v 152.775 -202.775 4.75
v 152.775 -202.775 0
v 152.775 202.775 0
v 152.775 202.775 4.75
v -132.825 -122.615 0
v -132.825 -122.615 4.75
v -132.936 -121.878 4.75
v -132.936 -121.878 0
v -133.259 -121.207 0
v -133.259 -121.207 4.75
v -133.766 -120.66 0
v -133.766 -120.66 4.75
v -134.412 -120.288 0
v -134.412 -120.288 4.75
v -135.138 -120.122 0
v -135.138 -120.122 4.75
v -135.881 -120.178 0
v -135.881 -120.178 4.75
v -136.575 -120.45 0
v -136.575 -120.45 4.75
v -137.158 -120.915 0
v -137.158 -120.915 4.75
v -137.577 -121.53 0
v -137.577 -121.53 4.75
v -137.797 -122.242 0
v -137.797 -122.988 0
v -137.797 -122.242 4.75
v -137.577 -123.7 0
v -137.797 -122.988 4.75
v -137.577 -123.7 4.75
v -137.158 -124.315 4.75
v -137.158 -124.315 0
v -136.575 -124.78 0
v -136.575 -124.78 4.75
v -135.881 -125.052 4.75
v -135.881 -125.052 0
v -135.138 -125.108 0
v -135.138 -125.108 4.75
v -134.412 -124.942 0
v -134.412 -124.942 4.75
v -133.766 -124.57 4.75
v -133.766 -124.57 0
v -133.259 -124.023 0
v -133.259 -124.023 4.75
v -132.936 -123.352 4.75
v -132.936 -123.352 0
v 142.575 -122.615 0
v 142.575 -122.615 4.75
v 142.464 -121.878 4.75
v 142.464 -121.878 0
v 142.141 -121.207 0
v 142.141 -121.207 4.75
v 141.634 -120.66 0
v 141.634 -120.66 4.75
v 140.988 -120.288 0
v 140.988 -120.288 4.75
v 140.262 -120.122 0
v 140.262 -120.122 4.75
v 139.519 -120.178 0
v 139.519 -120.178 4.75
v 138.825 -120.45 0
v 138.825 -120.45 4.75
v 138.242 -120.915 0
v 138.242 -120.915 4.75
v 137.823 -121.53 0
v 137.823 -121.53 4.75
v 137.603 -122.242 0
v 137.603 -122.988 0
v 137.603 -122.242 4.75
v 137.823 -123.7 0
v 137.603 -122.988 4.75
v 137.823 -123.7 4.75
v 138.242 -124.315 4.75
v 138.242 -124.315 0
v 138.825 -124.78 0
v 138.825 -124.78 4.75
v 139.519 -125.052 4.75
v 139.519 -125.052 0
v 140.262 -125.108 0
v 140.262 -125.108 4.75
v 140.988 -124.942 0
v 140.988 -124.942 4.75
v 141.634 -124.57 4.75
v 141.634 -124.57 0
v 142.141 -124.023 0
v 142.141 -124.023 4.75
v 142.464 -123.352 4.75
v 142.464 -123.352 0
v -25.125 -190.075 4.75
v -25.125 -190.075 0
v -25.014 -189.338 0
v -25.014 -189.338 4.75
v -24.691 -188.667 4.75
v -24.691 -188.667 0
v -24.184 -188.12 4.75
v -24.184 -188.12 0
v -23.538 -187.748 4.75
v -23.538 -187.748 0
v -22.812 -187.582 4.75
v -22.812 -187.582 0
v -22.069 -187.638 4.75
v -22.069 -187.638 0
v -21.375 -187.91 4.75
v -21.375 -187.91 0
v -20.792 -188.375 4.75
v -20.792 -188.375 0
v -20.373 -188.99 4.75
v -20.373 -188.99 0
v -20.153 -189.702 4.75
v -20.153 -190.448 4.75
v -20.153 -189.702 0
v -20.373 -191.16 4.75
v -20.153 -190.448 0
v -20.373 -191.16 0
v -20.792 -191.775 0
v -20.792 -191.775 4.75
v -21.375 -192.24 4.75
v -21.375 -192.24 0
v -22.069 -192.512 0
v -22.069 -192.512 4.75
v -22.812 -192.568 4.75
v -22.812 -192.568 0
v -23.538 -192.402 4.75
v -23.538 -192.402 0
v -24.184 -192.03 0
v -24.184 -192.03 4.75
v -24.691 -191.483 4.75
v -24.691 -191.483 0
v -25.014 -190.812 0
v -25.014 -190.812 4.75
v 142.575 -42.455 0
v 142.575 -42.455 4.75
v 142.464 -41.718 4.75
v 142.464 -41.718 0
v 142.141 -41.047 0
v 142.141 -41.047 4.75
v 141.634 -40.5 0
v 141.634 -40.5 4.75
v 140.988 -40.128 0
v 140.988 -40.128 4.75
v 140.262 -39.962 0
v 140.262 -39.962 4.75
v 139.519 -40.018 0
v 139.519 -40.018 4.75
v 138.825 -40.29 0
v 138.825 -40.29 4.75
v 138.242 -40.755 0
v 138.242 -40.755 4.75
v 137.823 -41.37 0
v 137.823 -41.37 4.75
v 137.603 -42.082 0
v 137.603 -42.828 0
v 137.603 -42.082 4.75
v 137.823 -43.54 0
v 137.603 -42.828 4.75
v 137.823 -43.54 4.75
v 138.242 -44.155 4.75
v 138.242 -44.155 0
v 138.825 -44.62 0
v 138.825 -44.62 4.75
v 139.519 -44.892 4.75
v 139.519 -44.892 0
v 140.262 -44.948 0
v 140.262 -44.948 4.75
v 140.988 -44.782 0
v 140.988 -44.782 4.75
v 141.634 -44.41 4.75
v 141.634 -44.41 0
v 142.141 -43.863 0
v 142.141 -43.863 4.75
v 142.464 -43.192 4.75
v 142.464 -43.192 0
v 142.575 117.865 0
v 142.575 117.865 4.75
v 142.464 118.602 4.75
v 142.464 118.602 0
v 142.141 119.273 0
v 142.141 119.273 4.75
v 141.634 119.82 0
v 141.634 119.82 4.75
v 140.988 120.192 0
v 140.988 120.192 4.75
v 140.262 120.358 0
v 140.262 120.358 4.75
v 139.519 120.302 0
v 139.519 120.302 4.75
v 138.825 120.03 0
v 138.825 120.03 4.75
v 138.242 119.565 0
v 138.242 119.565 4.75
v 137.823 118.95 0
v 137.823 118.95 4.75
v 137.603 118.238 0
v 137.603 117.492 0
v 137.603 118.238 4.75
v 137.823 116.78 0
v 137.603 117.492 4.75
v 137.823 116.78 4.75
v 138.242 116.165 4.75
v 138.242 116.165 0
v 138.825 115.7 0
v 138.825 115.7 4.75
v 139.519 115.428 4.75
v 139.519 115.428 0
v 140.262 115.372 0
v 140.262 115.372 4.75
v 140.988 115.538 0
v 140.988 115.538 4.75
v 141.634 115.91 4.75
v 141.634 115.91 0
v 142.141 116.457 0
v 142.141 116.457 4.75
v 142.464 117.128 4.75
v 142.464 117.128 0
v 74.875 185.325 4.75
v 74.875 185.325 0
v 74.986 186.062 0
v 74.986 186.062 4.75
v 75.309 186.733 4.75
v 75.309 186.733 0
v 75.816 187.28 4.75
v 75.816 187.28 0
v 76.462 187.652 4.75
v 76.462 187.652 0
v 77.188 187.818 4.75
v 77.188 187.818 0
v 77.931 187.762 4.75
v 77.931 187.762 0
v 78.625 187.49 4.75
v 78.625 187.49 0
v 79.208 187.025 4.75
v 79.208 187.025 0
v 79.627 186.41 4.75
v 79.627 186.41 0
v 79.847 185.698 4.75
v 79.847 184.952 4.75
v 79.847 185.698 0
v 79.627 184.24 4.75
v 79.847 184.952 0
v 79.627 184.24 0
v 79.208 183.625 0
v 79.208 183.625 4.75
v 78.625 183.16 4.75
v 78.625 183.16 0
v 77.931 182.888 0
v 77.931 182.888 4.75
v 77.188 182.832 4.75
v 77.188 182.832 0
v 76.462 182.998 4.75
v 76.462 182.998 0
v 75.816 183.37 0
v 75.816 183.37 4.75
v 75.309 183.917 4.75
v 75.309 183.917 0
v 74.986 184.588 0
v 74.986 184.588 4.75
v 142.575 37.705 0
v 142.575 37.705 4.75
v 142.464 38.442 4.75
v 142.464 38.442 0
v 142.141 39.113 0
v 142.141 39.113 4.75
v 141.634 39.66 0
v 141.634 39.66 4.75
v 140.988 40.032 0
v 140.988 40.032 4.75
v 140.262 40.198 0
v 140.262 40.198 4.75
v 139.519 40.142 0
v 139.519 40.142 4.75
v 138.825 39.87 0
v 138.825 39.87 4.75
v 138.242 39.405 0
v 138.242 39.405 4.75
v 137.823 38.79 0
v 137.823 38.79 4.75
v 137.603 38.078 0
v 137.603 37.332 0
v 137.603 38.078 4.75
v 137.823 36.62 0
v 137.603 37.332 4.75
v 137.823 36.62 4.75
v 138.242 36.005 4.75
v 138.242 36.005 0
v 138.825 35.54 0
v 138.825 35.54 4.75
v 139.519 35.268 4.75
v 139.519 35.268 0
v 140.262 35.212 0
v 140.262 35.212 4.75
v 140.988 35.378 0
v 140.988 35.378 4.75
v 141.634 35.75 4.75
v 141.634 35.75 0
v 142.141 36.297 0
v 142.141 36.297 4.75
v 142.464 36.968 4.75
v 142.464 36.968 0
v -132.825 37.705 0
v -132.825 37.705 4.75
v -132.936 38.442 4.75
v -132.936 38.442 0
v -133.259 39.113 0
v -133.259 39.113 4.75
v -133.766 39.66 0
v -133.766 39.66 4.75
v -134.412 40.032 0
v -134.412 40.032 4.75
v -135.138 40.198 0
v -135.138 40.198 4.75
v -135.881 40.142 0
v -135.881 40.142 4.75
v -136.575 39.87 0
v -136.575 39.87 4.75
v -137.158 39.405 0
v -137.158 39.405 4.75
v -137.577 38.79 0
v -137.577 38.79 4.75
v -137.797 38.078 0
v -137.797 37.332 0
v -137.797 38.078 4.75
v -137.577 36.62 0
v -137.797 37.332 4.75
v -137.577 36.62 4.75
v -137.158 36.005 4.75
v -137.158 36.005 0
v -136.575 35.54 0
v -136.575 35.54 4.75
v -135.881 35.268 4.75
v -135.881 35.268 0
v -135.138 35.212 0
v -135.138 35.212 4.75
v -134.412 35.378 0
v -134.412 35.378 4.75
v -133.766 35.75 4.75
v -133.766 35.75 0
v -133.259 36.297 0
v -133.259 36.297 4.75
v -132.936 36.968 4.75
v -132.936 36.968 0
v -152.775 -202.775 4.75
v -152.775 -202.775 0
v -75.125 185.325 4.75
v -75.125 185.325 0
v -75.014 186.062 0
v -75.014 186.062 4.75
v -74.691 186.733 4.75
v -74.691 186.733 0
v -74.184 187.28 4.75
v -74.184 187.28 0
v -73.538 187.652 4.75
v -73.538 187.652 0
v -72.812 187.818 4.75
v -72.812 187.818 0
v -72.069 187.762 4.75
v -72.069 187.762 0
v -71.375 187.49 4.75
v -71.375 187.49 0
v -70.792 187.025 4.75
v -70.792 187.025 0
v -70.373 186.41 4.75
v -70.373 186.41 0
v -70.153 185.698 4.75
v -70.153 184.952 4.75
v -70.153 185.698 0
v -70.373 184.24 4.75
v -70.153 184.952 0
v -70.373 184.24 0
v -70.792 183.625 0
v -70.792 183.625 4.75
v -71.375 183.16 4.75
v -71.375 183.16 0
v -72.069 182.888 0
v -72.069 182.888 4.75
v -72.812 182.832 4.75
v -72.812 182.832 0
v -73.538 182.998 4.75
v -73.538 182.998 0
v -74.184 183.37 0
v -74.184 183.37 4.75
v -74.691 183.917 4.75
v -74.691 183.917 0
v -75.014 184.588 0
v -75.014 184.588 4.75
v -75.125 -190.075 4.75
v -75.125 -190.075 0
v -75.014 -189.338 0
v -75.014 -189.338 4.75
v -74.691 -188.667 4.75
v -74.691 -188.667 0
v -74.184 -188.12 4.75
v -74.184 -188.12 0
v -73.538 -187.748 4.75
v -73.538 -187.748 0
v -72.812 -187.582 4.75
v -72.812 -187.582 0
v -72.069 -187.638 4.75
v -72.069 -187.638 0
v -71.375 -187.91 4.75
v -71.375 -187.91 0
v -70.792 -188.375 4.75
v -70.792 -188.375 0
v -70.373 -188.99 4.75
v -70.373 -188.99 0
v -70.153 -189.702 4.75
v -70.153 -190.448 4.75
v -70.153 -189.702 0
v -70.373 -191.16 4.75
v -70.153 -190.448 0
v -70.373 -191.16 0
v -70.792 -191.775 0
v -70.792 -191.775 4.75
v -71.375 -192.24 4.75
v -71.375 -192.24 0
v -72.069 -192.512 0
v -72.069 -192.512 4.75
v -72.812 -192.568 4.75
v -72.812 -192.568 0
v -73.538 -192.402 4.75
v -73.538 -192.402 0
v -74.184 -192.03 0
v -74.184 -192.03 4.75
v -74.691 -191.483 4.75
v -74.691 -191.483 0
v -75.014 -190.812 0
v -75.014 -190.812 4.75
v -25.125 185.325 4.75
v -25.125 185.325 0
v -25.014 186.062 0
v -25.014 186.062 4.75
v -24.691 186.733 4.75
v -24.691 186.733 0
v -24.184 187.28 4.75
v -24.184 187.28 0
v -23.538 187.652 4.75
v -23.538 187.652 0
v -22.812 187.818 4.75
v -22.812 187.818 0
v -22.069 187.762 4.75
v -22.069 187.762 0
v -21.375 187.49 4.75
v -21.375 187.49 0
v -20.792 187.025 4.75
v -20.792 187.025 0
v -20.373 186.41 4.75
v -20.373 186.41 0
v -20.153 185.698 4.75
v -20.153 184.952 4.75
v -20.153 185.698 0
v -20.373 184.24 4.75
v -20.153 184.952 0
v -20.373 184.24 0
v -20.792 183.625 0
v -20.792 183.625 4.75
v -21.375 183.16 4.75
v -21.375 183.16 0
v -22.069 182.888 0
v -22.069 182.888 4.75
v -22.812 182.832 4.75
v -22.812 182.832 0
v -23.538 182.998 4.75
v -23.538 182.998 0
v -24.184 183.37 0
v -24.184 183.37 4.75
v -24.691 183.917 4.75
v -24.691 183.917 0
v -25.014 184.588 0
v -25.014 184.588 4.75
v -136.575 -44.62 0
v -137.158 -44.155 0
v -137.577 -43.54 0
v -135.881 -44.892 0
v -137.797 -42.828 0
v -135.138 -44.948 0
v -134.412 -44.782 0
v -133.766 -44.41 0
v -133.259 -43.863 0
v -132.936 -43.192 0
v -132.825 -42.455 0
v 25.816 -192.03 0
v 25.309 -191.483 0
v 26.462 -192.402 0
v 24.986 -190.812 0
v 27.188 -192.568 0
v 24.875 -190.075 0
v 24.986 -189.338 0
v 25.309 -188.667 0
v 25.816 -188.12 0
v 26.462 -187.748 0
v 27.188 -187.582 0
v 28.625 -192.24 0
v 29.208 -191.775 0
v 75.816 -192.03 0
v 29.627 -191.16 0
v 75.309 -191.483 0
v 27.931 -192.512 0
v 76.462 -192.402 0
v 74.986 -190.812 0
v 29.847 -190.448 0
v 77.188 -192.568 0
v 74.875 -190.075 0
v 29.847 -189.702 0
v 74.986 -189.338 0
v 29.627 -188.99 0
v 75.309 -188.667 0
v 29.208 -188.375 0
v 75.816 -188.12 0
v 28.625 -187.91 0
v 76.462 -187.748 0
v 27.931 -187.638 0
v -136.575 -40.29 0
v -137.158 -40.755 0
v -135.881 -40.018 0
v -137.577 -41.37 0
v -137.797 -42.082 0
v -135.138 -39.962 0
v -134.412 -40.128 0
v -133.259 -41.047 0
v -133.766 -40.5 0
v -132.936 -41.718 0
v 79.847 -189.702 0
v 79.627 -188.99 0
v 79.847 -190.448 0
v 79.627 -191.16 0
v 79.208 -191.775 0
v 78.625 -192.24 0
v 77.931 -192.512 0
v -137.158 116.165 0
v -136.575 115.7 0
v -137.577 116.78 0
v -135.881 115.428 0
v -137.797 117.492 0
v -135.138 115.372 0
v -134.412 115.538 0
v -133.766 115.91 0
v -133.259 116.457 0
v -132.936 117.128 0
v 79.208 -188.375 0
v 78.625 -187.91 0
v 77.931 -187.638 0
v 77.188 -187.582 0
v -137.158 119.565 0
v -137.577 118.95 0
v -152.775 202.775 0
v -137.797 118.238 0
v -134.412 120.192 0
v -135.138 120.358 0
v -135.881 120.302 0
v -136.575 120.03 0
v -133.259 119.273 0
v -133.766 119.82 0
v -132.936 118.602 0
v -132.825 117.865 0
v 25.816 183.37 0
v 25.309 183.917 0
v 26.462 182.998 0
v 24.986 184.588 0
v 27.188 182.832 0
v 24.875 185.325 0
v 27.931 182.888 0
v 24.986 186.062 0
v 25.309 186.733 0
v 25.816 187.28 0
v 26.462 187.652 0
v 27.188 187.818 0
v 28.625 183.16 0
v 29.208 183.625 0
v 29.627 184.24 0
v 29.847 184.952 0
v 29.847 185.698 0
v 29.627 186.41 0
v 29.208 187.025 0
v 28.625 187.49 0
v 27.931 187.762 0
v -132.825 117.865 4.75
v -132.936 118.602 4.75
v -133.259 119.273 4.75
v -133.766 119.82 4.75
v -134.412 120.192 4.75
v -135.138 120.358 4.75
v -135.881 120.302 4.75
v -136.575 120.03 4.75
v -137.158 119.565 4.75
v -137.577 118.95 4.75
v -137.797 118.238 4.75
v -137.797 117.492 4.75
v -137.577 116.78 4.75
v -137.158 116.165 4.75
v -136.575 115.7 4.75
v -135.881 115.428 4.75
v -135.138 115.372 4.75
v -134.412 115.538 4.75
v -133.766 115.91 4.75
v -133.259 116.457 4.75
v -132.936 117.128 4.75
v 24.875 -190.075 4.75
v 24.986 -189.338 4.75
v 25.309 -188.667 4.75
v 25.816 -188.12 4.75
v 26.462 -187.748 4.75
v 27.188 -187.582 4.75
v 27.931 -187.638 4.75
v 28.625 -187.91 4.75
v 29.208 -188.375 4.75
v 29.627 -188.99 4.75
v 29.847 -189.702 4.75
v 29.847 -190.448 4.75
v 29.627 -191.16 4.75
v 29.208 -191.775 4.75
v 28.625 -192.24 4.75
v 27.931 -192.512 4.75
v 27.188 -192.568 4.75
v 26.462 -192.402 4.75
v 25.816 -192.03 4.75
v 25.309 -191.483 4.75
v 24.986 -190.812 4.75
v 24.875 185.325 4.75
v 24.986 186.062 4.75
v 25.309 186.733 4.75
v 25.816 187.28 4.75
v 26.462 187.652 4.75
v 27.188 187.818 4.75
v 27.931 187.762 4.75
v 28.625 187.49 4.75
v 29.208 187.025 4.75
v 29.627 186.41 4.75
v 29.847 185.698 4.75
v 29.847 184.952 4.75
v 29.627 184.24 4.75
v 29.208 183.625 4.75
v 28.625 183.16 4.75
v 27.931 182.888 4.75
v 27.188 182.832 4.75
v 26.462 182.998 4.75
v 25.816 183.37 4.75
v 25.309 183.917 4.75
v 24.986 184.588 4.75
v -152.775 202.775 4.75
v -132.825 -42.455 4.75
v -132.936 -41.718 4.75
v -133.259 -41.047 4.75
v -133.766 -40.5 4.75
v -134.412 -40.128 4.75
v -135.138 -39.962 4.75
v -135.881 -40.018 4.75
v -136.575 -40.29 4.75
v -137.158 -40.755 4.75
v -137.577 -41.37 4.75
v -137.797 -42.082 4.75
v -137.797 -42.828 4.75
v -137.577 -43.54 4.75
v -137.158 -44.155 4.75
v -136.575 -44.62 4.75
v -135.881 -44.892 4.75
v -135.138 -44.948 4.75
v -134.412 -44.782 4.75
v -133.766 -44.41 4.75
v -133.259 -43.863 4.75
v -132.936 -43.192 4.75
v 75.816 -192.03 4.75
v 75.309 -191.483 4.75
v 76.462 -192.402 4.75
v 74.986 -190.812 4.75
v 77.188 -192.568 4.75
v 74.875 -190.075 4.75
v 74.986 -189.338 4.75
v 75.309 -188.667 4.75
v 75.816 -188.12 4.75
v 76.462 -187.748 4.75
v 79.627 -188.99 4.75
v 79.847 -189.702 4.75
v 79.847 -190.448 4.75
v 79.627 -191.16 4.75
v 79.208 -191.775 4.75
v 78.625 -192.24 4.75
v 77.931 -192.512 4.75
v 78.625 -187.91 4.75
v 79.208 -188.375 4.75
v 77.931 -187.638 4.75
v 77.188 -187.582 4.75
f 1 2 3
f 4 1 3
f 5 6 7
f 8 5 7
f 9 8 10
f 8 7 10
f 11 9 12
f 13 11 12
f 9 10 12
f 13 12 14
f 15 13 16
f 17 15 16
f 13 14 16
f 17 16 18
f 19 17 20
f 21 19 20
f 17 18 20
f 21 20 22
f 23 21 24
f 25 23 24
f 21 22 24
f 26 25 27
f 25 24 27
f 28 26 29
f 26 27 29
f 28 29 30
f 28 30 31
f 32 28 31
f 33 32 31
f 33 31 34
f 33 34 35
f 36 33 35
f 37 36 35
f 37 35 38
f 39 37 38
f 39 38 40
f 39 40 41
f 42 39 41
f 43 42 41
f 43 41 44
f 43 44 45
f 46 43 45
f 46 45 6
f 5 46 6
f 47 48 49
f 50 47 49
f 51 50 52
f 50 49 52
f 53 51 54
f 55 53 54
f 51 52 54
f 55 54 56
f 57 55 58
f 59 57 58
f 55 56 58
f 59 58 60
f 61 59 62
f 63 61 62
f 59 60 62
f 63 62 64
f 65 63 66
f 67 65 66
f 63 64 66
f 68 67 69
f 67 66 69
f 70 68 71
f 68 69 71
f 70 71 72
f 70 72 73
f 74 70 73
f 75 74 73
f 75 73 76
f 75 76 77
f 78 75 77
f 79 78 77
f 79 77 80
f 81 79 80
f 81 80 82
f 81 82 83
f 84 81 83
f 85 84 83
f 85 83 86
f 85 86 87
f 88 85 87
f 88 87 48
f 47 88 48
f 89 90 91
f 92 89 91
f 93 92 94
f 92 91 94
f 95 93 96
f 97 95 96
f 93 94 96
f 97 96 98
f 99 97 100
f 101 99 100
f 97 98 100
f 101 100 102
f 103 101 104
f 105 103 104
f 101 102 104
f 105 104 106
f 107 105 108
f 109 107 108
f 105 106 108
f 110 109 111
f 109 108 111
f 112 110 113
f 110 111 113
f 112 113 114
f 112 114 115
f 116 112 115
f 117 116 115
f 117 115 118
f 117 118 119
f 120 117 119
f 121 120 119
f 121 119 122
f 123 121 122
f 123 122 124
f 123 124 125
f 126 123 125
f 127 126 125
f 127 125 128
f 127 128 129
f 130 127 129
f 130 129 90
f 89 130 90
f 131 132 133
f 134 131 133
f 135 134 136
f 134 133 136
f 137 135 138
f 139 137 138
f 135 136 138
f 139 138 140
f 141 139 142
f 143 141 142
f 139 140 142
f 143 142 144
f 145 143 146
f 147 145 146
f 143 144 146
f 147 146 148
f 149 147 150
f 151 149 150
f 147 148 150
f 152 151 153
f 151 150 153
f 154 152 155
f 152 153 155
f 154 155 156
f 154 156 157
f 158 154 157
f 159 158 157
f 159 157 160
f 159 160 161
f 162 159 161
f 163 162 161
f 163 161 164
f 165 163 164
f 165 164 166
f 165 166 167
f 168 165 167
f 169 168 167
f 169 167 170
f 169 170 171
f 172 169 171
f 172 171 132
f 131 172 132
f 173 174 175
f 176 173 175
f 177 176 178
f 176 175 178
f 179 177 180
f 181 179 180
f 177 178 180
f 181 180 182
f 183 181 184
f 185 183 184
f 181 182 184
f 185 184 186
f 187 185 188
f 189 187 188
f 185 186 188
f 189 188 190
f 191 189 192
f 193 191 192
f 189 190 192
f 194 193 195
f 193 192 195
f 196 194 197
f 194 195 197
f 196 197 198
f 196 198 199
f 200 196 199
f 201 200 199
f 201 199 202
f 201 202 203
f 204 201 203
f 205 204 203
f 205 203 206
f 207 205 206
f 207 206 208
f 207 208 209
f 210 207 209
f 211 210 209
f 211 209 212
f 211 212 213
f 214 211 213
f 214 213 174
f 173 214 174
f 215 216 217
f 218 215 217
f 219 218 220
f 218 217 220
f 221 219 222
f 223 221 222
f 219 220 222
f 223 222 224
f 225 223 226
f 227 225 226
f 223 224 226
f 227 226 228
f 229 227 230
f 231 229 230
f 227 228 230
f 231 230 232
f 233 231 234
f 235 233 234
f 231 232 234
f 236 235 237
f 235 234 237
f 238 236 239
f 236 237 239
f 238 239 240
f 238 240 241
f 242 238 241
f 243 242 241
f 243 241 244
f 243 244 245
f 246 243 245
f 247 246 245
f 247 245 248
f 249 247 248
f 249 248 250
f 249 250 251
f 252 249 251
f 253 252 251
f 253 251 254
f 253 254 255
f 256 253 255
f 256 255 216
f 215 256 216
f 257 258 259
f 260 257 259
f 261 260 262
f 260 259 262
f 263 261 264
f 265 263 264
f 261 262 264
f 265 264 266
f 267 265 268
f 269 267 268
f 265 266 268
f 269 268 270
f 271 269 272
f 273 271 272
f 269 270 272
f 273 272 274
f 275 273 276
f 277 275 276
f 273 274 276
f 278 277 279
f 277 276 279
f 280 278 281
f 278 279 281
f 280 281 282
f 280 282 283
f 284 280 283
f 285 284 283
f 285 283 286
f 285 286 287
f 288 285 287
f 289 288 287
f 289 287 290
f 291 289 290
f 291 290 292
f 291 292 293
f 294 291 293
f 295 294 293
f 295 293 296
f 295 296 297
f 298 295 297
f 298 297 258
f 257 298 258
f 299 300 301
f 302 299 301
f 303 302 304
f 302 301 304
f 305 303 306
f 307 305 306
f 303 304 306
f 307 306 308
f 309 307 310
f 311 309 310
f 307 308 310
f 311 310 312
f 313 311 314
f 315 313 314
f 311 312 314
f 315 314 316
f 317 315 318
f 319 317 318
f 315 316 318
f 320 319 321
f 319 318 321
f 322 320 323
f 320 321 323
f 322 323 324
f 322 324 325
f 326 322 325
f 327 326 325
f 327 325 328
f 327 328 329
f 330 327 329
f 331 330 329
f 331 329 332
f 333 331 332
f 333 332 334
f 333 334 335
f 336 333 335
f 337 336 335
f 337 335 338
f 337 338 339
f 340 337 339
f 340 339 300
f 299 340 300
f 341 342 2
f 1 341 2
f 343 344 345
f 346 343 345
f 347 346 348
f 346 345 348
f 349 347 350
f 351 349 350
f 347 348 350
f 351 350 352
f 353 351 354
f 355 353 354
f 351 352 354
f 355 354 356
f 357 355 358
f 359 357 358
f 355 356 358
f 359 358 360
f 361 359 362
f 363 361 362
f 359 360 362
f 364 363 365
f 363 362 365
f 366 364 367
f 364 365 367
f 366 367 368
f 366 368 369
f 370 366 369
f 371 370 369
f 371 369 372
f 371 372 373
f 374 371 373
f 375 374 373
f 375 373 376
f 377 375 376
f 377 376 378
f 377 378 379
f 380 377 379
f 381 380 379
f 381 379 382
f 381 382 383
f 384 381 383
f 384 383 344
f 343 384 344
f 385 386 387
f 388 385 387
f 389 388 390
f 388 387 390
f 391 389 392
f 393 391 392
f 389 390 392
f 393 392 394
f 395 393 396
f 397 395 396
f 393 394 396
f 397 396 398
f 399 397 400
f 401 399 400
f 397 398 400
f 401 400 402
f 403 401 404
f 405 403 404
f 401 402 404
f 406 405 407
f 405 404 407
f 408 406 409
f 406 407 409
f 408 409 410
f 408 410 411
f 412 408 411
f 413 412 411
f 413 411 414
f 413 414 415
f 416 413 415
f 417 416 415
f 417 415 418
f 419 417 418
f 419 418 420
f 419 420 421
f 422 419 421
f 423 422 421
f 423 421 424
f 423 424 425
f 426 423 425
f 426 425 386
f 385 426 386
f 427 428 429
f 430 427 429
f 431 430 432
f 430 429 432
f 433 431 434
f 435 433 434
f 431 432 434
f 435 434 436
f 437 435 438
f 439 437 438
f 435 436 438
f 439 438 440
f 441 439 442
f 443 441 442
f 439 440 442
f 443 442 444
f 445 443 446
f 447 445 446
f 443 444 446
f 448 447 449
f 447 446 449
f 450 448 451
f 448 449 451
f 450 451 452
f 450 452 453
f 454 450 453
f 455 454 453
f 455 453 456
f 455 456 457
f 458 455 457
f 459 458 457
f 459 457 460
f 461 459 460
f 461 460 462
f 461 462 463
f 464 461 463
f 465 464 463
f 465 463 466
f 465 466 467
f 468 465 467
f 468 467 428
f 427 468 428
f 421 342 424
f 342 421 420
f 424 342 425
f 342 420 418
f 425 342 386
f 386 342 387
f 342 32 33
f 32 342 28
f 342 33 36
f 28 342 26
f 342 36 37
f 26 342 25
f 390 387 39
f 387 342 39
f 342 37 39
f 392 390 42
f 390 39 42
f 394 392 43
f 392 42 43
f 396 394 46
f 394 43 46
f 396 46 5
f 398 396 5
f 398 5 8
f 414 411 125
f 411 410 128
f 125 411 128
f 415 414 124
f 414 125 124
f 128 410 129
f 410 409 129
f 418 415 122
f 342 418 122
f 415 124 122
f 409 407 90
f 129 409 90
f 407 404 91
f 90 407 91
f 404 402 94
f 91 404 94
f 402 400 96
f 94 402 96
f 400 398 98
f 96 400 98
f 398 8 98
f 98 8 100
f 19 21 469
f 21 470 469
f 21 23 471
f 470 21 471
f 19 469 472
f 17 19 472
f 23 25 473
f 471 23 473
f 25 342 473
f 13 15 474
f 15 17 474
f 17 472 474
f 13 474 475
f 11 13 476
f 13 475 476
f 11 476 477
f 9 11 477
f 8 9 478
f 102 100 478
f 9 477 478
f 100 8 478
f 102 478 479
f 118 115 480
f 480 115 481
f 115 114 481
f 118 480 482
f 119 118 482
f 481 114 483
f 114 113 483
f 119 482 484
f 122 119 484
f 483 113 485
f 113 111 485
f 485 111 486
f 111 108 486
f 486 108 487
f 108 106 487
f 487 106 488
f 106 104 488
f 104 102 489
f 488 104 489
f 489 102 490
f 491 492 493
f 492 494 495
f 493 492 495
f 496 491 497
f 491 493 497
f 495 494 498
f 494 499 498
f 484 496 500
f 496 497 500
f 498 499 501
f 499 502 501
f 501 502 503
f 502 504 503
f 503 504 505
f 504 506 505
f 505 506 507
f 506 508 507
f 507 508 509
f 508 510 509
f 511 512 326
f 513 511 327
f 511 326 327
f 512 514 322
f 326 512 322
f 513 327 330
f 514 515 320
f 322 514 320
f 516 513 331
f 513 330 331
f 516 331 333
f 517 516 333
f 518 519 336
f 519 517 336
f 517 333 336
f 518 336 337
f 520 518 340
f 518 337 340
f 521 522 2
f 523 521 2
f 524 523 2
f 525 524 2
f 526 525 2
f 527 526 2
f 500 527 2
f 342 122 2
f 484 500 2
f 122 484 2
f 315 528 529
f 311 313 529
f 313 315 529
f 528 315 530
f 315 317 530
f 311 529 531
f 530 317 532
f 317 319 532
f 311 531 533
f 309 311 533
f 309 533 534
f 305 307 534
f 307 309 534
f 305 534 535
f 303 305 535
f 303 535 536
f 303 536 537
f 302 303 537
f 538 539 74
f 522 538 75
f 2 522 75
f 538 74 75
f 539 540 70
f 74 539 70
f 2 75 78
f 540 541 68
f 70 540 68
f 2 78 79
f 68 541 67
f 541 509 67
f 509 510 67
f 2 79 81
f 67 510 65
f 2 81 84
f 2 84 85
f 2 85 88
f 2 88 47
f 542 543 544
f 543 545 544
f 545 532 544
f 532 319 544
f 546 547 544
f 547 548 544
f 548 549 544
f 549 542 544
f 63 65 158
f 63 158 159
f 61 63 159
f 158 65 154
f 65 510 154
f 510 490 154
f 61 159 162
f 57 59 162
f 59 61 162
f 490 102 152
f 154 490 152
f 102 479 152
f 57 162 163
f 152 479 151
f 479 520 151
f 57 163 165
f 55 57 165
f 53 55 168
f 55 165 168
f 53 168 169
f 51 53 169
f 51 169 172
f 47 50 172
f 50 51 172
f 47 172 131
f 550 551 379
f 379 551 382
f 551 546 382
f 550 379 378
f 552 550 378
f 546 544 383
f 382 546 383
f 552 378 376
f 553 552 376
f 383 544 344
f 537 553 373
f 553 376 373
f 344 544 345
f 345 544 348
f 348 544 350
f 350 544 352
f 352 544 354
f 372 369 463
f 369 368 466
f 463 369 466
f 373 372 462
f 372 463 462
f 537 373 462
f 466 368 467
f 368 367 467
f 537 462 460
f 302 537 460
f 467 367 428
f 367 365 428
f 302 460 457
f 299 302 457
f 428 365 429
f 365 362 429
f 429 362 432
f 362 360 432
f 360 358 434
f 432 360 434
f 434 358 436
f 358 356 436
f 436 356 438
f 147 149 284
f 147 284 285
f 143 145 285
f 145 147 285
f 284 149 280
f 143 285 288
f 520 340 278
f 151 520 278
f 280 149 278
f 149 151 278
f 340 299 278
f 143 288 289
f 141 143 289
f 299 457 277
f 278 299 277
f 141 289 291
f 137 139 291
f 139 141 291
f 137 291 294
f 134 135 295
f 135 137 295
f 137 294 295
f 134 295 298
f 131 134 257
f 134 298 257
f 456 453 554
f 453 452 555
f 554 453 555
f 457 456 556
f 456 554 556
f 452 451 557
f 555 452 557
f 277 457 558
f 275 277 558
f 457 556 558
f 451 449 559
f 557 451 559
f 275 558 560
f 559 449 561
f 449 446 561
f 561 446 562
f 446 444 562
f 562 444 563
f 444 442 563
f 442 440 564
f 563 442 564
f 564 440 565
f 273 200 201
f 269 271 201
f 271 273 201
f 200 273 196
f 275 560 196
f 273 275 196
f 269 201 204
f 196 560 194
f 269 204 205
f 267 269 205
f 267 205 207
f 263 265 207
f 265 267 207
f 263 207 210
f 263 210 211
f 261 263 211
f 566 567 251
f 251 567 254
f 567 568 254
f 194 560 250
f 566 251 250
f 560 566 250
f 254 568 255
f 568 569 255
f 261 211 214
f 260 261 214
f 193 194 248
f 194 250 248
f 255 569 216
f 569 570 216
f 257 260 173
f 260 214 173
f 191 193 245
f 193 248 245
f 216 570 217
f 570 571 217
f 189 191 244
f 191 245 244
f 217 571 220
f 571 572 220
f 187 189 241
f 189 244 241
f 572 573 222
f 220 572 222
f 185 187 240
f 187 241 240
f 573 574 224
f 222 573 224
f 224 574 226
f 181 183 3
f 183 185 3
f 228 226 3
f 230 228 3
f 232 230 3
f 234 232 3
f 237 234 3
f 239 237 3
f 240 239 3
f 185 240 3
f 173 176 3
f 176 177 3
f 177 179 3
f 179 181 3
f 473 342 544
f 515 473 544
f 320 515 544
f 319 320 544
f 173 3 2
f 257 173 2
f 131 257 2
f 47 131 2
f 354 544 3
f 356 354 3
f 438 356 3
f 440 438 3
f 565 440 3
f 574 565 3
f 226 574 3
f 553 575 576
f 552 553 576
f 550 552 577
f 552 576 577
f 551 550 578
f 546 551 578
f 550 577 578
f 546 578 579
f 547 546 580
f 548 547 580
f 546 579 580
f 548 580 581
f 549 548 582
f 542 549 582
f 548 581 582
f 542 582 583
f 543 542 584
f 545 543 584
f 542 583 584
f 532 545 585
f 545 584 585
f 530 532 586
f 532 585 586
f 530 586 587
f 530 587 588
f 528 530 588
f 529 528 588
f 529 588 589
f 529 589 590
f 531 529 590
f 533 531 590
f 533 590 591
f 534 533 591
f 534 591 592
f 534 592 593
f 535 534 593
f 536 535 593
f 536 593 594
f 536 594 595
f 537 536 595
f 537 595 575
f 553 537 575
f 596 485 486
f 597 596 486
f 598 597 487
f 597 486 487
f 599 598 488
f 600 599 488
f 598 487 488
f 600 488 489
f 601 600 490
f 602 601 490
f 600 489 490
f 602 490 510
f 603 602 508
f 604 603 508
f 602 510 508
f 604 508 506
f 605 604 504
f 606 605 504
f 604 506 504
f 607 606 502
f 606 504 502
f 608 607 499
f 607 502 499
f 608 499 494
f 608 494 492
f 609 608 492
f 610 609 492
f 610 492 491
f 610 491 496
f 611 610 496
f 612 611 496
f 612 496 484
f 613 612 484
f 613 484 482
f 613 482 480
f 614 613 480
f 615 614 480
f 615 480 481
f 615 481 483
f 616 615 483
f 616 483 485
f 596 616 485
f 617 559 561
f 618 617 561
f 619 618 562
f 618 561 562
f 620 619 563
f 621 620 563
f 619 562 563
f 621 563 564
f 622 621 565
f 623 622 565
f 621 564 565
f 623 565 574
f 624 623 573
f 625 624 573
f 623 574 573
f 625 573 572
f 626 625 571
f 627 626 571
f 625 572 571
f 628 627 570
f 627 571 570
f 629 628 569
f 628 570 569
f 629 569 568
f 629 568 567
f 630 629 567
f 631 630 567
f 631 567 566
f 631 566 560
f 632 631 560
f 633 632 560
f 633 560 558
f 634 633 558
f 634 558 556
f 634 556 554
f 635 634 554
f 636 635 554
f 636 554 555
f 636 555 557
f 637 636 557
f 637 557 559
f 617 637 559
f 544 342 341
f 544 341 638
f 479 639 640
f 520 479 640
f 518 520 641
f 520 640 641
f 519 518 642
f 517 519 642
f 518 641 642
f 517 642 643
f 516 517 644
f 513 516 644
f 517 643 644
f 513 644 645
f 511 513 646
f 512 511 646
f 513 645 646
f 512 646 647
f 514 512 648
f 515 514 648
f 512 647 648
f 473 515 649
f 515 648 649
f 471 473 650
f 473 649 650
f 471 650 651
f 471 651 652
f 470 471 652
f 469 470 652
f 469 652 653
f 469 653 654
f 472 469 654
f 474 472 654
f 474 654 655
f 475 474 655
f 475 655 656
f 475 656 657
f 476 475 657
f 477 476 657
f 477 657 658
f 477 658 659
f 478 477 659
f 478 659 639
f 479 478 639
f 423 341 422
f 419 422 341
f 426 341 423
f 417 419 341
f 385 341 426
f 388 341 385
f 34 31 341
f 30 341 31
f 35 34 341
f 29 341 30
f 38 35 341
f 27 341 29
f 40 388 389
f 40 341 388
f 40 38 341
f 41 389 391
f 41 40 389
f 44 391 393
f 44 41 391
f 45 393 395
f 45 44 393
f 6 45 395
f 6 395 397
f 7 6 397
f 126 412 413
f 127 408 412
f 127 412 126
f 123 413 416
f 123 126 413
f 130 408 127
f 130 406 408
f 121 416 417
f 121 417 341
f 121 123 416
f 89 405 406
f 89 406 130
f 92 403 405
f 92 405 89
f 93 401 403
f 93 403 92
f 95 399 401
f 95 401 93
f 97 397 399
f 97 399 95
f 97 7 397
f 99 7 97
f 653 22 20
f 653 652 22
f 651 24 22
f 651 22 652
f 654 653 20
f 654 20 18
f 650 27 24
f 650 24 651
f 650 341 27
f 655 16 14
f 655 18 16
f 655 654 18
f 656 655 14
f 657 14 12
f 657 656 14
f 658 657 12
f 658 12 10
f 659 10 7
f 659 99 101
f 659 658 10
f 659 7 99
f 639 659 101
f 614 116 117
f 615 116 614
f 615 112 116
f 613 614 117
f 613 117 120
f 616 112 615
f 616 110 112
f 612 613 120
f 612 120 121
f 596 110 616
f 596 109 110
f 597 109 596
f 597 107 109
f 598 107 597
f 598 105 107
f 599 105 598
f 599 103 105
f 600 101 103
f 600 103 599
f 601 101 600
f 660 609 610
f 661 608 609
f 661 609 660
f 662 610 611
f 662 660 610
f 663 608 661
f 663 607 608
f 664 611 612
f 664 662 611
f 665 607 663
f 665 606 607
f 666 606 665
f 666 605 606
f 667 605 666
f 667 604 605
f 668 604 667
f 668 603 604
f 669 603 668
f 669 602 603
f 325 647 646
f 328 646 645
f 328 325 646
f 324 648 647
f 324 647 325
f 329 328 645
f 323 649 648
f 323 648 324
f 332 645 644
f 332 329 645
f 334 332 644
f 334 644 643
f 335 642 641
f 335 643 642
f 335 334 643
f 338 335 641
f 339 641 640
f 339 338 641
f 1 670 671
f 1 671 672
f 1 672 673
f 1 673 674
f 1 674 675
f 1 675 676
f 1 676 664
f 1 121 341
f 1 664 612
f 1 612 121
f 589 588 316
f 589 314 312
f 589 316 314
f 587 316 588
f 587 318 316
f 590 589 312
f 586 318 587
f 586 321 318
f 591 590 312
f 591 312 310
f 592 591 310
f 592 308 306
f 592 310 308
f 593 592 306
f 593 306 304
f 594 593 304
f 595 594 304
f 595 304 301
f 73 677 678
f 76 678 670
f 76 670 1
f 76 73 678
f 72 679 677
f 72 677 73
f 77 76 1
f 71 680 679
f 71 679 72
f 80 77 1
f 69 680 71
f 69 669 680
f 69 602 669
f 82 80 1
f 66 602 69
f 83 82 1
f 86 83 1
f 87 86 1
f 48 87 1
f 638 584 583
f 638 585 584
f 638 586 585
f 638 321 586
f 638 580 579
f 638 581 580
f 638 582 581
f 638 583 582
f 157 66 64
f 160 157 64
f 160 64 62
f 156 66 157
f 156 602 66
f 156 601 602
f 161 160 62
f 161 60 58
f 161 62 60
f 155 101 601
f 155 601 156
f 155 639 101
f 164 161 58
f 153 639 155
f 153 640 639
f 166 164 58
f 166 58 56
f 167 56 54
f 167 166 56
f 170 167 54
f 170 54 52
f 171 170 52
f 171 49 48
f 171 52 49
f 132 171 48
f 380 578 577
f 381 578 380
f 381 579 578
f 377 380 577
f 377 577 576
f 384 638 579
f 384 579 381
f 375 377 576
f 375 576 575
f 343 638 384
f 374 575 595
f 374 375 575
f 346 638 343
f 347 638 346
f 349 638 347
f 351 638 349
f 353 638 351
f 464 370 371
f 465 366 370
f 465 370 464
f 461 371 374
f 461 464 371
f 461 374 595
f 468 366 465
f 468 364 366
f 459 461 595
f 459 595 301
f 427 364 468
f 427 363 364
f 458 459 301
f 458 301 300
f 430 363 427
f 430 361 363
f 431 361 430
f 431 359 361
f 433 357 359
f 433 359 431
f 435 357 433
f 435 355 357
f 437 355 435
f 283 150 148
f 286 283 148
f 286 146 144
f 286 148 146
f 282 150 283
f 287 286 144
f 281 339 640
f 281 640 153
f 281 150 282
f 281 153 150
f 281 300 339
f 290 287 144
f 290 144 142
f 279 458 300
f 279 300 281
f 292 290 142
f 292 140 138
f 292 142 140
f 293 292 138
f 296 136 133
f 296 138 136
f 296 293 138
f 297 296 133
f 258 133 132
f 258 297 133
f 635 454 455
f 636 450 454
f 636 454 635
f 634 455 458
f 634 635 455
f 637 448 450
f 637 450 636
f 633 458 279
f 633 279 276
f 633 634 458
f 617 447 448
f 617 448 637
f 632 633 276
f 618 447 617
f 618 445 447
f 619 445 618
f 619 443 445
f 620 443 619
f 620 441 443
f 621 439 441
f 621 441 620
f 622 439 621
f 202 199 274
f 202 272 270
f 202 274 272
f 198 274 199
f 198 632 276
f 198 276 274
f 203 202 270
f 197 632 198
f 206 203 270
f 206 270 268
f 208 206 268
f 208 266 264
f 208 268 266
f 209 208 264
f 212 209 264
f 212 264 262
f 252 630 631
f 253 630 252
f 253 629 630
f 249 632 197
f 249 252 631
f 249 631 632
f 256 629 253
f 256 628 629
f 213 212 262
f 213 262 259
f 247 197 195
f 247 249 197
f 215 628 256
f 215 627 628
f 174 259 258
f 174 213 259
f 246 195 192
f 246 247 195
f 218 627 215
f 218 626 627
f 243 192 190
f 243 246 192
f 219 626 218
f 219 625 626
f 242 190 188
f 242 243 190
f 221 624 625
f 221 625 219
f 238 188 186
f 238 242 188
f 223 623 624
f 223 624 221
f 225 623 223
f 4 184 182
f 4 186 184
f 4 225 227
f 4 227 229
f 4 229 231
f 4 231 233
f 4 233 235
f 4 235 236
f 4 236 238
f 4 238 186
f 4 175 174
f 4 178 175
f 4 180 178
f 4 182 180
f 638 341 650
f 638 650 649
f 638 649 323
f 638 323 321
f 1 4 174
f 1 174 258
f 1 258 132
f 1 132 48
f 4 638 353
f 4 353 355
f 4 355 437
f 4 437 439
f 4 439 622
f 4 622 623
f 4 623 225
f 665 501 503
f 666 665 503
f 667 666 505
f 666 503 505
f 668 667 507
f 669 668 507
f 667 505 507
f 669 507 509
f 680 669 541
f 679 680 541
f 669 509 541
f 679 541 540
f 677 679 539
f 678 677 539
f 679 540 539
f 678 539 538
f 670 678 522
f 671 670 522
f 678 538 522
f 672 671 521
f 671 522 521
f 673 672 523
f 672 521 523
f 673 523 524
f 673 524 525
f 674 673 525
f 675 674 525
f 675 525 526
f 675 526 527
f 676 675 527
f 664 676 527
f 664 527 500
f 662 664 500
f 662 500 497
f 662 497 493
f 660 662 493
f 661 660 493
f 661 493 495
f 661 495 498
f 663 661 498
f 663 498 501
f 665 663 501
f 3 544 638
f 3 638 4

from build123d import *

# Parameters (mm, degrees)
SKETCH_1_W          = 305.55
SKETCH_1_H          = 405.55
EXTRUDE_1_DEPTH     = 4.75
SKETCH_3_R          = 2.5
CUT_EXTRUDE_1_DEPTH = 10
SKETCH_5_R          = 2.5
CUT_EXTRUDE_3_DEPTH = 10
SKETCH_6_R          = 2.5
CUT_EXTRUDE_4_DEPTH = 10
SKETCH_7_R          = 2.5
CUT_EXTRUDE_5_DEPTH = 10


with BuildPart() as part:
    # 草圖1 → 填料-伸長1 (new body)
    with BuildSketch(Plane.XY):
        Rectangle(SKETCH_1_W, SKETCH_1_H)
    extrude(amount=EXTRUDE_1_DEPTH)

    # 草圖3 → 除料-伸長1 (cut)
    with BuildSketch(Plane.XY.offset(4.75)):
        with Locations((140.075, 37.705)):
            Circle(SKETCH_3_R)
        with Locations((140.075, 117.865)):
            Circle(SKETCH_3_R)
        with Locations((140.075, -42.455)):
            Circle(SKETCH_3_R)
        with Locations((140.075, -122.615)):
            Circle(SKETCH_3_R)
    extrude(amount=-CUT_EXTRUDE_1_DEPTH, mode=Mode.SUBTRACT)

    # 草圖5 → 除料-伸長3 (cut)
    with BuildSketch(Plane.XY.offset(4.75)):
        with Locations((-135.325, -122.615)):
            Circle(SKETCH_5_R)
        with Locations((-135.325, -42.455)):
            Circle(SKETCH_5_R)
        with Locations((-135.325, 37.705)):
            Circle(SKETCH_5_R)
        with Locations((-135.325, 117.865)):
            Circle(SKETCH_5_R)
    extrude(amount=-CUT_EXTRUDE_3_DEPTH, mode=Mode.SUBTRACT)

    # 草圖6 → 除料-伸長4 (cut)
    with BuildSketch(Plane(origin=(0, 0, 0), x_dir=(-1, 0, 0), z_dir=(0, 0, -1))):
        with Locations((22.625, 185.325)):
            Circle(SKETCH_6_R)
        with Locations((72.625, 185.325)):
            Circle(SKETCH_6_R)
        with Locations((-77.375, 185.325)):
            Circle(SKETCH_6_R)
        with Locations((-27.375, 185.325)):
            Circle(SKETCH_6_R)
    extrude(amount=-CUT_EXTRUDE_4_DEPTH, mode=Mode.SUBTRACT)

    # 草圖7 → 除料-伸長5 (cut)
    with BuildSketch(Plane(origin=(0, 0, 0), x_dir=(-1, 0, 0), z_dir=(0, 0, -1))):
        with Locations((-77.375, -190.075)):
            Circle(SKETCH_7_R)
        with Locations((-27.375, -190.075)):
            Circle(SKETCH_7_R)
        with Locations((22.625, -190.075)):
            Circle(SKETCH_7_R)
        with Locations((72.625, -190.075)):
            Circle(SKETCH_7_R)
    extrude(amount=-CUT_EXTRUDE_5_DEPTH, mode=Mode.SUBTRACT)


solid = part.part
